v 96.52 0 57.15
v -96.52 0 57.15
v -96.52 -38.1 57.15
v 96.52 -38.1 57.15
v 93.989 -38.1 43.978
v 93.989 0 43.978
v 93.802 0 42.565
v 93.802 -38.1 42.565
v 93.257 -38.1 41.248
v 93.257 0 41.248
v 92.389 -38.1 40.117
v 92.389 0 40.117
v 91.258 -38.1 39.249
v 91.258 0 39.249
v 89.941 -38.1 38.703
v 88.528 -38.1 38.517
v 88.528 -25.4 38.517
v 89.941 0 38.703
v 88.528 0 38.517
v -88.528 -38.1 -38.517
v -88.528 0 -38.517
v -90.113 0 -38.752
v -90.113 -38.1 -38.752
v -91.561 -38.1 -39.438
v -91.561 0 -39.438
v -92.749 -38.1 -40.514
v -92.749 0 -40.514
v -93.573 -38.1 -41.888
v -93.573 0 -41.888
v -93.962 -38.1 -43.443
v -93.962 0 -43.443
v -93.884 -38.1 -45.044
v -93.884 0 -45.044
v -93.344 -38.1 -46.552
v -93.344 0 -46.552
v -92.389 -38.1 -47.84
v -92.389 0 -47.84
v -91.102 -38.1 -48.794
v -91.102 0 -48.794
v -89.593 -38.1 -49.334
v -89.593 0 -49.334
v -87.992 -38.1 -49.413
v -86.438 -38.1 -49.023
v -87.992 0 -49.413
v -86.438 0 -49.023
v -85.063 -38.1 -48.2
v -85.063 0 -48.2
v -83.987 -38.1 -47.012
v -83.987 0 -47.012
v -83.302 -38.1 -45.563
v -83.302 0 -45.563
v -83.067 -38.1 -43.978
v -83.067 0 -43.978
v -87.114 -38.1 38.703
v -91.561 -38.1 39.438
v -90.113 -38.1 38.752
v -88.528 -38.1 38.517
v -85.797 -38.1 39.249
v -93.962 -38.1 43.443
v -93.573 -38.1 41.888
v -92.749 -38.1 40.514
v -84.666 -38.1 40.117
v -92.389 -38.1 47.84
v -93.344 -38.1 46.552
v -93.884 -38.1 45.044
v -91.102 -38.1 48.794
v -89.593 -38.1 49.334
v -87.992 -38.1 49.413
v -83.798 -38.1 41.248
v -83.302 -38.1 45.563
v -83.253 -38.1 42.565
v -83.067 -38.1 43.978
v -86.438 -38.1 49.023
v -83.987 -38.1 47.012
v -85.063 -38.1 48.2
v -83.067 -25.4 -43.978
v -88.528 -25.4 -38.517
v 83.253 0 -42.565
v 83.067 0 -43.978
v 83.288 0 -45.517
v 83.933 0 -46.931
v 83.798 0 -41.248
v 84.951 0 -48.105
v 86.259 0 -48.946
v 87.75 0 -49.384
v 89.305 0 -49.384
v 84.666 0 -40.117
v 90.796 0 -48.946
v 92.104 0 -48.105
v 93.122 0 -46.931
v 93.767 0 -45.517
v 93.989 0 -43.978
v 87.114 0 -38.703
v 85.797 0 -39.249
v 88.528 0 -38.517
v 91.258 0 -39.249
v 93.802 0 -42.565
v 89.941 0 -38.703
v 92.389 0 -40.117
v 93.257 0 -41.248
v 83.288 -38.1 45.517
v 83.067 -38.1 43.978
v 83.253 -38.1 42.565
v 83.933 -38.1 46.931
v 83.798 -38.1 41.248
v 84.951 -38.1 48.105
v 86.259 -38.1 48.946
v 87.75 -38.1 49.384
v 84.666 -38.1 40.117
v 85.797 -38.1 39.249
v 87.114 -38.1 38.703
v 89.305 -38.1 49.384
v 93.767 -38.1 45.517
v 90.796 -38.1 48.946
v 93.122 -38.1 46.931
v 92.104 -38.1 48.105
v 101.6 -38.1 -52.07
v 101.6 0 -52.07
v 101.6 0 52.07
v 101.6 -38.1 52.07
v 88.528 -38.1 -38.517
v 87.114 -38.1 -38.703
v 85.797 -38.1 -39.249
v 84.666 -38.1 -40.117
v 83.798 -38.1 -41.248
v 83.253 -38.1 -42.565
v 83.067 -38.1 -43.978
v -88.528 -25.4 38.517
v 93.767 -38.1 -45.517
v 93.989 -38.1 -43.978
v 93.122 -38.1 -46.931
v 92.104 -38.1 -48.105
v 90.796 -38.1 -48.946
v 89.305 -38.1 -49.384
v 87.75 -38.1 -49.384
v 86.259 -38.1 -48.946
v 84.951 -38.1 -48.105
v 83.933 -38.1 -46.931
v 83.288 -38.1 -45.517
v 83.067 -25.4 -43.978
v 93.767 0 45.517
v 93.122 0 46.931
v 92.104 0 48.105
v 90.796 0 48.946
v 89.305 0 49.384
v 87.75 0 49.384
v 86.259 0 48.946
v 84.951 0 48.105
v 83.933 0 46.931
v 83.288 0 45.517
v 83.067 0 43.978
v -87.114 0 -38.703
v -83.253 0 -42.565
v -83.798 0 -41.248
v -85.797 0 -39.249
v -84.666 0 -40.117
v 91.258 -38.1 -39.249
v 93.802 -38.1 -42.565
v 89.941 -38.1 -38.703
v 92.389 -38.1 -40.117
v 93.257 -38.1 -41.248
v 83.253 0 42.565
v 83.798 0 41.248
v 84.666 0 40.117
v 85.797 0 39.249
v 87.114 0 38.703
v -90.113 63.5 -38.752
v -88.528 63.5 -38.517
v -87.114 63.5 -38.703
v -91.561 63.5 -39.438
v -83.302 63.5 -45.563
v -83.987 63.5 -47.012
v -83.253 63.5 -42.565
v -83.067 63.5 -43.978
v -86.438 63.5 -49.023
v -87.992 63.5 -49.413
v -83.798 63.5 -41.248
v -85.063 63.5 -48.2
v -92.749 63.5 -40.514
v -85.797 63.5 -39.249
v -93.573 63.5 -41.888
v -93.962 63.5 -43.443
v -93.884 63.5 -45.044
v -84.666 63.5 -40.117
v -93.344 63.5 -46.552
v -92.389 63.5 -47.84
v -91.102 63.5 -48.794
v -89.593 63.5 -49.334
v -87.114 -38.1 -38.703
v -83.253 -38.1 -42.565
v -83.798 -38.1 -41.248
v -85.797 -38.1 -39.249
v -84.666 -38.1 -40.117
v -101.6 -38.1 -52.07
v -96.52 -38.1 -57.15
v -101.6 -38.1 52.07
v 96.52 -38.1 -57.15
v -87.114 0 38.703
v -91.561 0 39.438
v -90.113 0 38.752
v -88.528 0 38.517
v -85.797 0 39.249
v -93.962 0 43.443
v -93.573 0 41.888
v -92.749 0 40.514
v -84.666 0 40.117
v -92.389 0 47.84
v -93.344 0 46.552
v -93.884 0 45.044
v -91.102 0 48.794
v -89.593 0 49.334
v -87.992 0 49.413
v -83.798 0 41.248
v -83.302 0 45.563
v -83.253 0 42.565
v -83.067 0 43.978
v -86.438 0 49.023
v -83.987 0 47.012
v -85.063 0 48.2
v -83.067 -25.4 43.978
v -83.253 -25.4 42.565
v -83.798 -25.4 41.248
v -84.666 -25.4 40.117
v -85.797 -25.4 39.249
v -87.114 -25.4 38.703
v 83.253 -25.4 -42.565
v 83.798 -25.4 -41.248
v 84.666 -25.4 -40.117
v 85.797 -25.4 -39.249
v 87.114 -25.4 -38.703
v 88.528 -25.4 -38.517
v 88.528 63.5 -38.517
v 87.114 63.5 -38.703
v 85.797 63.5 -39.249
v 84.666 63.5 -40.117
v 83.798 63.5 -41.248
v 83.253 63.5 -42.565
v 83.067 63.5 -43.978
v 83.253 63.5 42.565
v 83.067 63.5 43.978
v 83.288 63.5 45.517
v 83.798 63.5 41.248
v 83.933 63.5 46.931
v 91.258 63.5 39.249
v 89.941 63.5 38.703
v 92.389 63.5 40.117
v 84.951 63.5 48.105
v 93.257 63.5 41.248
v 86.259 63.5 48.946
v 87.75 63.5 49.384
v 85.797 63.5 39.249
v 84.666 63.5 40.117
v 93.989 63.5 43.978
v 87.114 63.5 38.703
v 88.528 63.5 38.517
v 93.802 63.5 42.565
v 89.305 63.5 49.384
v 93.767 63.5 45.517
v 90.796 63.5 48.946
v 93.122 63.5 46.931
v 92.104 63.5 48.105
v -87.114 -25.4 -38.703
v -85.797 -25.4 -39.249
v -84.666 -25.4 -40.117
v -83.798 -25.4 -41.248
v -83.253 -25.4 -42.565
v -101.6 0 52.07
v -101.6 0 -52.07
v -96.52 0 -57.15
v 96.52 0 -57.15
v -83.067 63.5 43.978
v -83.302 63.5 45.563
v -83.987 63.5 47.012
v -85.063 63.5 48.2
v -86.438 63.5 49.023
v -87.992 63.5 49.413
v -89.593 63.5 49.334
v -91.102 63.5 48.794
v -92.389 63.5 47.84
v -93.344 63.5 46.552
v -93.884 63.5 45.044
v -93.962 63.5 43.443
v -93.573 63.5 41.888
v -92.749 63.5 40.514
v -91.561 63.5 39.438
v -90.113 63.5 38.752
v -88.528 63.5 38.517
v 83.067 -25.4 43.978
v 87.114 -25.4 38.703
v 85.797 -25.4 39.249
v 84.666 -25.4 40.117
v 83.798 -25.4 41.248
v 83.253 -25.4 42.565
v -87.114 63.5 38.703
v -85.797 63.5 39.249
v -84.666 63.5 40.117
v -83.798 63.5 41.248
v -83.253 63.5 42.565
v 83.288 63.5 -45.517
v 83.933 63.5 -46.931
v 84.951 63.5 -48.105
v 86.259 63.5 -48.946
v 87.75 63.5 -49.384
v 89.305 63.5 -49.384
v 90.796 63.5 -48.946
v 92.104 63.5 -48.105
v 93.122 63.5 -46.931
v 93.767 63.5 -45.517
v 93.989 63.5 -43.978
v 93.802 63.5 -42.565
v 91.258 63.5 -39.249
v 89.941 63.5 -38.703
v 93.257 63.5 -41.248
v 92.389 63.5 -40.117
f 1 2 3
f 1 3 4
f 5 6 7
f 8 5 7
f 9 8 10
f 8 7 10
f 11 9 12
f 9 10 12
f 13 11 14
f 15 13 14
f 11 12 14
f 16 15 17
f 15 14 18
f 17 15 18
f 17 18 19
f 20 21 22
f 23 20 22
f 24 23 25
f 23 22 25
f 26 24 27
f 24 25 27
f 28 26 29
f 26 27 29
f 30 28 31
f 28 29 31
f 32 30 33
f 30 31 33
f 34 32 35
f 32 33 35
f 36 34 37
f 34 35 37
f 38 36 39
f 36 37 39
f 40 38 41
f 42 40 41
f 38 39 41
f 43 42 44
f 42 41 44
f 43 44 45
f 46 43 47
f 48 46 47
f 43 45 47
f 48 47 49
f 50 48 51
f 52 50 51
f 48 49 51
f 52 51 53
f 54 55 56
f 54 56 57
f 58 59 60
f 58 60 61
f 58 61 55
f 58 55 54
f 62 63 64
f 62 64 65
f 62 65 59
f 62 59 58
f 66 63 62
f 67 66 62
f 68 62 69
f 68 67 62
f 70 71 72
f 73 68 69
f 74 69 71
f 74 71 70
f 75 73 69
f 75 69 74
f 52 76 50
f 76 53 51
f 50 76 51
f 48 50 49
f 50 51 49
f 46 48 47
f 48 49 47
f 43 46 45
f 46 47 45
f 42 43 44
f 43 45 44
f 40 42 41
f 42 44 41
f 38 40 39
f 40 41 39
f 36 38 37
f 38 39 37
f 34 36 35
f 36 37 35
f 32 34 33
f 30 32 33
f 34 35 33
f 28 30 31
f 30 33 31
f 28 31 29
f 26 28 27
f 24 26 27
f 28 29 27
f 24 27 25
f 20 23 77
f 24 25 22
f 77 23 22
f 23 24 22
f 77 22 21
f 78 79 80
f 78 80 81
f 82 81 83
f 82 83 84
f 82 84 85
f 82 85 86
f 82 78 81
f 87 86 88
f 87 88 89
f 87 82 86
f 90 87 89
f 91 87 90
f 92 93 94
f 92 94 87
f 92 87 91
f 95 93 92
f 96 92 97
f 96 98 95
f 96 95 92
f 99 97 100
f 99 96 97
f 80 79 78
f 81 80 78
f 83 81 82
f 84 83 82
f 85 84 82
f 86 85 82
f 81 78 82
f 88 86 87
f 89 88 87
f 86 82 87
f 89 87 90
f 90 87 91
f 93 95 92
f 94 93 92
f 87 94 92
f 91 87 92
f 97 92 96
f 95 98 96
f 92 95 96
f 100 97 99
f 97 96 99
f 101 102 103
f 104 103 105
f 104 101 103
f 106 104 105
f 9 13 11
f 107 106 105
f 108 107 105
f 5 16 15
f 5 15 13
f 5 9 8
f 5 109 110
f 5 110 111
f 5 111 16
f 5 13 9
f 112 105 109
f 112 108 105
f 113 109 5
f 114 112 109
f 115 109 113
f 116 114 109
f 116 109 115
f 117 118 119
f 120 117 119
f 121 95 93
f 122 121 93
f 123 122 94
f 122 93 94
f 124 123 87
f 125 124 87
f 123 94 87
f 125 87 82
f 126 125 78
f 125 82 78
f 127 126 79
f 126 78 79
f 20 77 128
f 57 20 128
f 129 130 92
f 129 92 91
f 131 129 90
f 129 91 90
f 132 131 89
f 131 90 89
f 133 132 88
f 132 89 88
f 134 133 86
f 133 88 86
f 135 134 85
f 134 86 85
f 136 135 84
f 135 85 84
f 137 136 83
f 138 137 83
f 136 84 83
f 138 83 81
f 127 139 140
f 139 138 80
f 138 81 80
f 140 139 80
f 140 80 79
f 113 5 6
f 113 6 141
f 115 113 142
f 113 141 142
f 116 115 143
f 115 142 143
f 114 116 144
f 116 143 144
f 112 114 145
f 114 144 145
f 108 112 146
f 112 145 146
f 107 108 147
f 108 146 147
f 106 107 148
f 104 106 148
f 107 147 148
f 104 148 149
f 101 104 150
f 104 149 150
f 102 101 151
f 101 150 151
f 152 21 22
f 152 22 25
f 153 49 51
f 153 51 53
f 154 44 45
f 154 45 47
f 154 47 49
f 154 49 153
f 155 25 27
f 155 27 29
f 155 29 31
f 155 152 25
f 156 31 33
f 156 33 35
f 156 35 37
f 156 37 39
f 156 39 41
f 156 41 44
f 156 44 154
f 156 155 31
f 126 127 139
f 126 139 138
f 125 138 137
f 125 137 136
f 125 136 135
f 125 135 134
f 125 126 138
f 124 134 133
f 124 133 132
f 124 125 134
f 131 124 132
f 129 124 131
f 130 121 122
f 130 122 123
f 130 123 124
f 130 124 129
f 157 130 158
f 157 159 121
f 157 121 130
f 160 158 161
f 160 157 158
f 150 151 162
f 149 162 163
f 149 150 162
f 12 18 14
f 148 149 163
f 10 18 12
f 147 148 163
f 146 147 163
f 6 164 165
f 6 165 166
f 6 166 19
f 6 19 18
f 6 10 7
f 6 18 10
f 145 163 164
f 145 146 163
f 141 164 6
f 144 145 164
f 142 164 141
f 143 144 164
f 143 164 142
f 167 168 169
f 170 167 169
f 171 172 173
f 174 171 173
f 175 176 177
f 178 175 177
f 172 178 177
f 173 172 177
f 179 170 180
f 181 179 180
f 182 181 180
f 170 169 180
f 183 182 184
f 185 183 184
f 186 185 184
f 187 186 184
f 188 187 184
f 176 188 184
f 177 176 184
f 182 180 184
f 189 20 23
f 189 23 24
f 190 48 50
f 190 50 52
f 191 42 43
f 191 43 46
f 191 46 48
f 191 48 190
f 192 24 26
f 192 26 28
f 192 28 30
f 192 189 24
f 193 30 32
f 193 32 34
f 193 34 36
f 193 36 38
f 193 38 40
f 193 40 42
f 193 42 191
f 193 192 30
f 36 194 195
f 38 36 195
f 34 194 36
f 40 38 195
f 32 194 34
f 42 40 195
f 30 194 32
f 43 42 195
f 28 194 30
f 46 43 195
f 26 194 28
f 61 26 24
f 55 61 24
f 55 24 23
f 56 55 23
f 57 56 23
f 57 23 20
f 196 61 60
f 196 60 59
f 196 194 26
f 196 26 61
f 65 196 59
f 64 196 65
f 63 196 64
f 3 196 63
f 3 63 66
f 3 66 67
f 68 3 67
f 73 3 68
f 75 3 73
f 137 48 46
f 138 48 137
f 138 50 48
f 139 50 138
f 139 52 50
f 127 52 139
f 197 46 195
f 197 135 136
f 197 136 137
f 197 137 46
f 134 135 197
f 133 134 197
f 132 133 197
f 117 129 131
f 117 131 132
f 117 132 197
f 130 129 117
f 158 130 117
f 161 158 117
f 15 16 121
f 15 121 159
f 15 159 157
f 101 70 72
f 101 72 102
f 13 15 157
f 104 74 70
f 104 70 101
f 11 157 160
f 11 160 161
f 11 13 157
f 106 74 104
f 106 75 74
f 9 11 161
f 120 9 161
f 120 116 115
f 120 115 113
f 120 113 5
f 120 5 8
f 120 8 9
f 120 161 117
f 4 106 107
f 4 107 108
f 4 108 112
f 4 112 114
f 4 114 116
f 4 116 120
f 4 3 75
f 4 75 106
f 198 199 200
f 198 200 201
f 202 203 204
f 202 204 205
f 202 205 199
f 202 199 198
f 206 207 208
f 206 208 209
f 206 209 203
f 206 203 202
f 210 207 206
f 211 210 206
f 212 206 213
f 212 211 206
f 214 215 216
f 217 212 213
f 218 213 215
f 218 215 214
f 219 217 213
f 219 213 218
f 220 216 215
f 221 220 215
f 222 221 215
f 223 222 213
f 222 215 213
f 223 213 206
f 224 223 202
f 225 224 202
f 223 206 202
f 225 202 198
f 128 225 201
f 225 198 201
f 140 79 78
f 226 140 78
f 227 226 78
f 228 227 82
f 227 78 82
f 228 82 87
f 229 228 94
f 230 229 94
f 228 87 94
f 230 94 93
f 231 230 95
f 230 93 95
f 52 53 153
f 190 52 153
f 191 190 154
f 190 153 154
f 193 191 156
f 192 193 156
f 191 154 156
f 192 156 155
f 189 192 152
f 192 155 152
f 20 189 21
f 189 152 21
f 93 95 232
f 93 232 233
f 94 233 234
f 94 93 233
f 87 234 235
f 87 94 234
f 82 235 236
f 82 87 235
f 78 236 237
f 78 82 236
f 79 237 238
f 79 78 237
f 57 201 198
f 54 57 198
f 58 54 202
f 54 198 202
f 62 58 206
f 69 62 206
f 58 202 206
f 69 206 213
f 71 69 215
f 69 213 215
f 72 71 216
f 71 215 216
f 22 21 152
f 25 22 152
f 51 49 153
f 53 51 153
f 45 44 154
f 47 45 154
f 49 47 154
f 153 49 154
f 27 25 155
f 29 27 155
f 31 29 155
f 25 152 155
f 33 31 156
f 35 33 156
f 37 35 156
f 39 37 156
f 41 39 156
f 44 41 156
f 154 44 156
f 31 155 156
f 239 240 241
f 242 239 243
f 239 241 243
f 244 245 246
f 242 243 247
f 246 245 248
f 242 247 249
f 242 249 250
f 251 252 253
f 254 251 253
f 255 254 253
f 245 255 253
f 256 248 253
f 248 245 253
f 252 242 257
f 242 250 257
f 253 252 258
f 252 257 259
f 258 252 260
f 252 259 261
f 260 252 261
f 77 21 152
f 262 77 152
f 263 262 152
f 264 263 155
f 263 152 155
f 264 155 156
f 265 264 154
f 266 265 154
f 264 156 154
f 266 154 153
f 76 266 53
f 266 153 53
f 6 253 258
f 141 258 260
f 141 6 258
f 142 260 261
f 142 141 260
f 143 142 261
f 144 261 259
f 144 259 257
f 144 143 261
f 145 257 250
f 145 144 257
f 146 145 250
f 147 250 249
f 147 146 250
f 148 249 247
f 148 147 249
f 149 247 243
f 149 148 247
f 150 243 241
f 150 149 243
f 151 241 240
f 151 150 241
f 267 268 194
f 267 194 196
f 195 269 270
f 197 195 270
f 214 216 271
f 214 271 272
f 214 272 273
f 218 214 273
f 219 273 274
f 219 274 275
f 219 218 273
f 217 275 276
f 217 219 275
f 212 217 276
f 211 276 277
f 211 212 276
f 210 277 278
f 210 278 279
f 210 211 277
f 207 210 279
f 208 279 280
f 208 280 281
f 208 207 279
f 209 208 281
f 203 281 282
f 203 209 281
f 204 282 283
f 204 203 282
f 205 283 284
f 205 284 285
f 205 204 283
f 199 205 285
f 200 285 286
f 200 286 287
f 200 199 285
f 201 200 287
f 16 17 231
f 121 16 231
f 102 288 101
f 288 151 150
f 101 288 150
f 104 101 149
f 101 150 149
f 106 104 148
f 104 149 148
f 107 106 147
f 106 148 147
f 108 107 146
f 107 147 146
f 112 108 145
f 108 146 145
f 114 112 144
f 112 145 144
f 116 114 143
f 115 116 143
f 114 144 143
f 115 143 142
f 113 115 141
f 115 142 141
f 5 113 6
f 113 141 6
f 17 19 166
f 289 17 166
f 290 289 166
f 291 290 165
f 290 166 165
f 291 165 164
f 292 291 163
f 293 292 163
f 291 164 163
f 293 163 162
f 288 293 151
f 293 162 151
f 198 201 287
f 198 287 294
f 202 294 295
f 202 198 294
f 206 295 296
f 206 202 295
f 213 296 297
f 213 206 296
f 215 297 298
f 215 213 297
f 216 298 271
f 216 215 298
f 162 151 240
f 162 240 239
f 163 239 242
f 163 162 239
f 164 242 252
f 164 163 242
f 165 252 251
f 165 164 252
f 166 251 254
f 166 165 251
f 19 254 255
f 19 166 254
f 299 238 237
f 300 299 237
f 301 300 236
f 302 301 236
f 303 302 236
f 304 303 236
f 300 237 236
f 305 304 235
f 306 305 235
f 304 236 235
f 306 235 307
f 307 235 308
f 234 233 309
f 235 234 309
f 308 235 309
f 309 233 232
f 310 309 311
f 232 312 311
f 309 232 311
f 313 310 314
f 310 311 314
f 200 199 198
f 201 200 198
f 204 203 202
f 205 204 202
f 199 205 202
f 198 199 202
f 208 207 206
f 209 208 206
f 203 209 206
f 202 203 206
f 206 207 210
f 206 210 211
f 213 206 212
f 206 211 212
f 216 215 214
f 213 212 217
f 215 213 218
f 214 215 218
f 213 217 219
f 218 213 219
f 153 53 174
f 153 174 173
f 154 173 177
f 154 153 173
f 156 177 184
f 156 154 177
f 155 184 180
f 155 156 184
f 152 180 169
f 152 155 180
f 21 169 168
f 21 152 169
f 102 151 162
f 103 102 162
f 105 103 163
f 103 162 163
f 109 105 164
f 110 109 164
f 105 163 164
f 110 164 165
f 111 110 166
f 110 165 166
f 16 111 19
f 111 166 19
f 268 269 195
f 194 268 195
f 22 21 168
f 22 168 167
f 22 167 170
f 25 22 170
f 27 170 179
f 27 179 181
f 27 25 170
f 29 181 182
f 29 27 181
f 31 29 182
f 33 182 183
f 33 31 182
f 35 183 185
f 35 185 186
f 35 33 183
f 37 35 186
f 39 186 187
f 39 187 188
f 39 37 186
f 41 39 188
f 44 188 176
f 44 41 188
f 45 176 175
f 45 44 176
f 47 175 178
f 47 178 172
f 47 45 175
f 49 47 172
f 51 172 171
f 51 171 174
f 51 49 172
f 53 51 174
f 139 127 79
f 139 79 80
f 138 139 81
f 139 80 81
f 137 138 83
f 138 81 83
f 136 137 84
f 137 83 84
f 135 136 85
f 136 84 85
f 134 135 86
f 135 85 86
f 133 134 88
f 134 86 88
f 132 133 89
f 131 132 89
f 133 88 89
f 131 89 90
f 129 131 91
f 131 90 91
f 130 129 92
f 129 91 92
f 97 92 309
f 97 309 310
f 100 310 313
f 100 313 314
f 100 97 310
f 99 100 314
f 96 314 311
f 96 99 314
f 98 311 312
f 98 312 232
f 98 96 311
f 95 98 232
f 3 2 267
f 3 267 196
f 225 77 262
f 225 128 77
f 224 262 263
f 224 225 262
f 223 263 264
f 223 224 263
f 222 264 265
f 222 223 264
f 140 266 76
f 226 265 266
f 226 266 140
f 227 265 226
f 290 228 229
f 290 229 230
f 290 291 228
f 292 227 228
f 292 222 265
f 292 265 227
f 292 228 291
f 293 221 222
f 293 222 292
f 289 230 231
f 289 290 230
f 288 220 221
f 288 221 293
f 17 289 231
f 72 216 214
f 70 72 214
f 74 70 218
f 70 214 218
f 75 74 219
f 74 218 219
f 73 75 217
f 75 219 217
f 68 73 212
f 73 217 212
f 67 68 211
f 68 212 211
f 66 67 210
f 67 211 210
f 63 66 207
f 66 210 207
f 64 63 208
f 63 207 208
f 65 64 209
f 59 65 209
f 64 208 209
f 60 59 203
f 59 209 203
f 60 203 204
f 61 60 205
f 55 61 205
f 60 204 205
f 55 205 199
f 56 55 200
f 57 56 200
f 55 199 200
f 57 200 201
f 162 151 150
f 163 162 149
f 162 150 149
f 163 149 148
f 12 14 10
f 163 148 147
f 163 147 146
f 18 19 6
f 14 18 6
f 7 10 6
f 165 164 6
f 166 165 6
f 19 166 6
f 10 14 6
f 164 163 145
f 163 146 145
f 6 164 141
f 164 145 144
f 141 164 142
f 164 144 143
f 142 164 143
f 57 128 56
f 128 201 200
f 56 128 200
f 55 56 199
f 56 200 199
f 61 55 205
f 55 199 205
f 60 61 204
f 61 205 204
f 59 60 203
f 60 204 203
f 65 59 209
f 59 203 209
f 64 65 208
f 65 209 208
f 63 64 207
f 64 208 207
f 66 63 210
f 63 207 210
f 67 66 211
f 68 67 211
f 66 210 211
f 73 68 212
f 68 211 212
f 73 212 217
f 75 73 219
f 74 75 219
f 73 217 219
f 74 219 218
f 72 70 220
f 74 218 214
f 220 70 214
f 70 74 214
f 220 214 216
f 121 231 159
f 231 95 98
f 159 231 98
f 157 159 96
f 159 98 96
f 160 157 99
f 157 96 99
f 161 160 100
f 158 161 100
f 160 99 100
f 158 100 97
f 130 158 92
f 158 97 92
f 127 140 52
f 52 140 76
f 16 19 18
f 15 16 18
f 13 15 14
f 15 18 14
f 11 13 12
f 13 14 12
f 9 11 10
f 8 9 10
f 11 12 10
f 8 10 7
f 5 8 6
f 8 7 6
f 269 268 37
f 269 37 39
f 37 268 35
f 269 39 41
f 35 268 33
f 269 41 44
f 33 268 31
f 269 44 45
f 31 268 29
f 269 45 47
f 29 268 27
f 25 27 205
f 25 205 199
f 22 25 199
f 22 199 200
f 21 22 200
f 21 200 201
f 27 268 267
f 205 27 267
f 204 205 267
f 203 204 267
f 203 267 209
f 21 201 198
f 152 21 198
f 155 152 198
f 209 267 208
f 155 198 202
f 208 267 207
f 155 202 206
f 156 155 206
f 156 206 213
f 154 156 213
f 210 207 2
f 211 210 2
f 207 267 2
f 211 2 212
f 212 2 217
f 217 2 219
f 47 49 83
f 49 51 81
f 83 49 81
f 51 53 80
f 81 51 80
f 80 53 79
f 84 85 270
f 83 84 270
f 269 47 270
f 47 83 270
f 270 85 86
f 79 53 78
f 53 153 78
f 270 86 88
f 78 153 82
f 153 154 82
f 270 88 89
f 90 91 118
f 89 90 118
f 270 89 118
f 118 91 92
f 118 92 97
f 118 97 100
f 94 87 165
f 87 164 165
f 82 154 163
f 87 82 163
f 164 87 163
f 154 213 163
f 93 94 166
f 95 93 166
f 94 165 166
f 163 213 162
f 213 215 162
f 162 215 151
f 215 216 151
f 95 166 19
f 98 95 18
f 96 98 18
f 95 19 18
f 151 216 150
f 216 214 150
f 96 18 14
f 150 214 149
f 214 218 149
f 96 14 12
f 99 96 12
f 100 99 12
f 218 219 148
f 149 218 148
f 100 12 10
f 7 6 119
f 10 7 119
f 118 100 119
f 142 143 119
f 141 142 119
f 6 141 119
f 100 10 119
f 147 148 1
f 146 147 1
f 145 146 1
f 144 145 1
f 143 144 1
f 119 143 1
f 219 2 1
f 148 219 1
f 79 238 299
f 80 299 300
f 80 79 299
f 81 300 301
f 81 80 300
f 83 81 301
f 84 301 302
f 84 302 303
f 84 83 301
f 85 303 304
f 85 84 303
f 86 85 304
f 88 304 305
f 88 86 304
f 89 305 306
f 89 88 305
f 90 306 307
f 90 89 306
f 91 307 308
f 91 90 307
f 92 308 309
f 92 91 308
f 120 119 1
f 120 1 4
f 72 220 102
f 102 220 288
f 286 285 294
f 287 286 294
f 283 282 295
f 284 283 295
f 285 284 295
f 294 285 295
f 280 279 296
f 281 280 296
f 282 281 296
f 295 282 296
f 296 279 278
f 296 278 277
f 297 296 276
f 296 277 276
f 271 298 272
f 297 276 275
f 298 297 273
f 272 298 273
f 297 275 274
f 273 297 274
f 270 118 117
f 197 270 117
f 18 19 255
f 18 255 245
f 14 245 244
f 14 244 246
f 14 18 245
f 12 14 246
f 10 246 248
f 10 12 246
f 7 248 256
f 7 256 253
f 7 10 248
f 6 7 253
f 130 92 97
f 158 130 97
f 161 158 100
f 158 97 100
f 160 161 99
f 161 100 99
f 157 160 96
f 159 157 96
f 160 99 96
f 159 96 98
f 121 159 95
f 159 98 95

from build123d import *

# Parameters (mm, degrees)
F1_DEPTH = 25.4
F0_W     = 203.2
F0_H     = 114.3
F2_DEPTH = 38.1
F3_DEPTH = 38.1
F4_DEPTH = 63.5
F5_SIZE  = 5.08


with BuildPart() as f1:
    # F0 (on Front) → F1 (new body)
    with BuildSketch(Plane.XZ):
        with BuildLine():
            ThreePointArc((-88.5275304317, -38.5171881869), (-84.6660202997, -40.1166780548), (-83.0665304317, -43.9781881869))
            Line((-83.0665304317, -43.9781881869), (83.0665304317, -43.9781881869))
            ThreePointArc((83.0665304317, -43.9781881869), (84.6660202997, -40.1166780548), (88.5275304317, -38.5171881869))
            Line((88.5275304317, -38.5171881869), (88.5275304317, 38.5171881869))
            ThreePointArc((88.5275304317, 38.5171881869), (84.6660202997, 40.1166780548), (83.0665304317, 43.9781881869))
            Line((83.0665304317, 43.9781881869), (-83.0665304317, 43.9781881869))
            ThreePointArc((-83.0665304317, 43.9781881869), (-84.6660202997, 40.1166780548), (-88.5275304317, 38.5171881869))
            Line((-88.5275304317, 38.5171881869), (-88.5275304317, -38.5171881869))
        make_face()
    extrude(amount=F1_DEPTH)

    # F0 (on Front) → F2 (join)
    with BuildSketch(Plane.XZ):
        Rectangle(F0_W, F0_H)
        with BuildLine():
            Line((83.0665304317, -43.9781881869), (-83.0665304317, -43.9781881869))
            ThreePointArc((-83.0665304317, -43.9781881869), (-92.3890405638, -47.8396983189), (-88.5275304317, -38.5171881869))
            Line((-88.5275304317, -38.5171881869), (-88.5275304317, 38.5171881869))
            ThreePointArc((-88.5275304317, 38.5171881869), (-92.3890405638, 47.8396983189), (-83.0665304317, 43.9781881869))
            Line((-83.0665304317, 43.9781881869), (83.0665304317, 43.9781881869))
            ThreePointArc((83.0665304317, 43.9781881869), (88.5275304317, 49.4391881869), (93.9885304317, 43.9781881869))
            ThreePointArc((93.9885304317, 43.9781881869), (92.3890405638, 40.1166780548), (88.5275304317, 38.5171881869))
            Line((88.5275304317, 38.5171881869), (88.5275304317, -38.5171881869))
            ThreePointArc((88.5275304317, -38.5171881869), (92.3890405638, -40.1166780548), (93.9885304317, -43.9781881869))
            ThreePointArc((93.9885304317, -43.9781881869), (88.5275304317, -49.4391881869), (83.0665304317, -43.9781881869))
        make_face(mode=Mode.SUBTRACT)
    extrude(amount=F2_DEPTH)

    # F5
    f5_edges = [f1.edges().sort_by_distance(p)[0] for p in [
        (-101.6, -19.05, -57.15),
        (101.6, -19.05, -57.15),
        (101.6, -19.05, 57.15),
        (-101.6, -19.05, 57.15),
    ]]
    chamfer(f5_edges, length=F5_SIZE)


with BuildPart() as f3:
    # F0 (on Front) → F3 (new body)
    with BuildSketch(Plane.XZ):
        with BuildLine():
            ThreePointArc((-83.0665304317, 43.9781881869), (-92.3890405638, 47.8396983189), (-88.5275304317, 38.5171881869))
            Line((-88.5275304317, 38.5171881869), (-88.5275304317, 43.9781881869))
            Line((-88.5275304317, 43.9781881869), (-83.0665304317, 43.9781881869))
        make_face()
        with BuildLine():
            Line((-88.5275304317, 43.9781881869), (-88.5275304317, 38.5171881869))
            ThreePointArc((-88.5275304317, 38.5171881869), (-84.6660202997, 40.1166780548), (-83.0665304317, 43.9781881869))
            Line((-83.0665304317, 43.9781881869), (-88.5275304317, 43.9781881869))
        make_face()
    extrude(amount=F3_DEPTH)


with BuildPart() as f3b:
    # F0 (on Front) → F3, piece 2 (new body)
    with BuildSketch(Plane.XZ):
        with BuildLine():
            ThreePointArc((-88.5275304317, -38.5171881869), (-92.3890405638, -47.8396983189), (-83.0665304317, -43.9781881869))
            Line((-83.0665304317, -43.9781881869), (-88.5275304317, -43.9781881869))
            Line((-88.5275304317, -43.9781881869), (-88.5275304317, -38.5171881869))
        make_face()
        with BuildLine():
            Line((-88.5275304317, -43.9781881869), (-83.0665304317, -43.9781881869))
            ThreePointArc((-83.0665304317, -43.9781881869), (-84.6660202997, -40.1166780548), (-88.5275304317, -38.5171881869))
            Line((-88.5275304317, -38.5171881869), (-88.5275304317, -43.9781881869))
        make_face()
    extrude(amount=F3_DEPTH)


with BuildPart() as f3c:
    # F0 (on Front) → F3, piece 3 (new body)
    with BuildSketch(Plane.XZ):
        with BuildLine():
            Line((88.5275304317, 43.9781881869), (88.5275304317, 38.5171881869))
            ThreePointArc((88.5275304317, 38.5171881869), (92.3890405638, 40.1166780548), (93.9885304317, 43.9781881869))
            ThreePointArc((93.9885304317, 43.9781881869), (88.5275304317, 49.4391881869), (83.0665304317, 43.9781881869))
            Line((83.0665304317, 43.9781881869), (88.5275304317, 43.9781881869))
        make_face()
        with BuildLine():
            ThreePointArc((83.0665304317, 43.9781881869), (84.6660202997, 40.1166780548), (88.5275304317, 38.5171881869))
            Line((88.5275304317, 38.5171881869), (88.5275304317, 43.9781881869))
            Line((88.5275304317, 43.9781881869), (83.0665304317, 43.9781881869))
        make_face()
    extrude(amount=F3_DEPTH)


with BuildPart() as f3d:
    # F0 (on Front) → F3, piece 4 (new body)
    with BuildSketch(Plane.XZ):
        with BuildLine():
            Line((88.5275304317, -43.9781881869), (83.0665304317, -43.9781881869))
            ThreePointArc((83.0665304317, -43.9781881869), (88.5275304317, -49.4391881869), (93.9885304317, -43.9781881869))
            ThreePointArc((93.9885304317, -43.9781881869), (92.3890405638, -40.1166780548), (88.5275304317, -38.5171881869))
            Line((88.5275304317, -38.5171881869), (88.5275304317, -43.9781881869))
        make_face()
        with BuildLine():
            ThreePointArc((88.5275304317, -38.5171881869), (84.6660202997, -40.1166780548), (83.0665304317, -43.9781881869))
            Line((83.0665304317, -43.9781881869), (88.5275304317, -43.9781881869))
            Line((88.5275304317, -43.9781881869), (88.5275304317, -38.5171881869))
        make_face()
    extrude(amount=F3_DEPTH)


with BuildPart() as f4:
    # F0 (on Front) → F4 (new body)
    with BuildSketch(Plane.XZ):
        with BuildLine():
            ThreePointArc((-88.5275304317, -38.5171881869), (-92.3890405638, -47.8396983189), (-83.0665304317, -43.9781881869))
            Line((-83.0665304317, -43.9781881869), (-88.5275304317, -43.9781881869))
            Line((-88.5275304317, -43.9781881869), (-88.5275304317, -38.5171881869))
        make_face()
        with BuildLine():
            Line((-88.5275304317, -43.9781881869), (-83.0665304317, -43.9781881869))
            ThreePointArc((-83.0665304317, -43.9781881869), (-84.6660202997, -40.1166780548), (-88.5275304317, -38.5171881869))
            Line((-88.5275304317, -38.5171881869), (-88.5275304317, -43.9781881869))
        make_face()
    extrude(amount=-F4_DEPTH)


with BuildPart() as f4b:
    # F0 (on Front) → F4, piece 2 (new body)
    with BuildSketch(Plane.XZ):
        with BuildLine():
            Line((-88.5275304317, 43.9781881869), (-88.5275304317, 38.5171881869))
            ThreePointArc((-88.5275304317, 38.5171881869), (-84.6660202997, 40.1166780548), (-83.0665304317, 43.9781881869))
            Line((-83.0665304317, 43.9781881869), (-88.5275304317, 43.9781881869))
        make_face()
        with BuildLine():
            ThreePointArc((-83.0665304317, 43.9781881869), (-92.3890405638, 47.8396983189), (-88.5275304317, 38.5171881869))
            Line((-88.5275304317, 38.5171881869), (-88.5275304317, 43.9781881869))
            Line((-88.5275304317, 43.9781881869), (-83.0665304317, 43.9781881869))
        make_face()
    extrude(amount=-F4_DEPTH)


with BuildPart() as f4c:
    # F0 (on Front) → F4, piece 3 (new body)
    with BuildSketch(Plane.XZ):
        with BuildLine():
            ThreePointArc((88.5275304317, -38.5171881869), (84.6660202997, -40.1166780548), (83.0665304317, -43.9781881869))
            Line((83.0665304317, -43.9781881869), (88.5275304317, -43.9781881869))
            Line((88.5275304317, -43.9781881869), (88.5275304317, -38.5171881869))
        make_face()
        with BuildLine():
            Line((88.5275304317, -43.9781881869), (83.0665304317, -43.9781881869))
            ThreePointArc((83.0665304317, -43.9781881869), (88.5275304317, -49.4391881869), (93.9885304317, -43.9781881869))
            ThreePointArc((93.9885304317, -43.9781881869), (92.3890405638, -40.1166780548), (88.5275304317, -38.5171881869))
            Line((88.5275304317, -38.5171881869), (88.5275304317, -43.9781881869))
        make_face()
    extrude(amount=-F4_DEPTH)


with BuildPart() as f4d:
    # F0 (on Front) → F4, piece 4 (new body)
    with BuildSketch(Plane.XZ):
        with BuildLine():
            ThreePointArc((83.0665304317, 43.9781881869), (84.6660202997, 40.1166780548), (88.5275304317, 38.5171881869))
            Line((88.5275304317, 38.5171881869), (88.5275304317, 43.9781881869))
            Line((88.5275304317, 43.9781881869), (83.0665304317, 43.9781881869))
        make_face()
        with BuildLine():
            Line((88.5275304317, 43.9781881869), (88.5275304317, 38.5171881869))
            ThreePointArc((88.5275304317, 38.5171881869), (92.3890405638, 40.1166780548), (93.9885304317, 43.9781881869))
            ThreePointArc((93.9885304317, 43.9781881869), (88.5275304317, 49.4391881869), (83.0665304317, 43.9781881869))
            Line((83.0665304317, 43.9781881869), (88.5275304317, 43.9781881869))
        make_face()
    extrude(amount=-F4_DEPTH)


solid = Compound([f1.part, f3.part, f3b.part, f3c.part, f3d.part, f4.part, f4b.part, f4c.part, f4d.part])
